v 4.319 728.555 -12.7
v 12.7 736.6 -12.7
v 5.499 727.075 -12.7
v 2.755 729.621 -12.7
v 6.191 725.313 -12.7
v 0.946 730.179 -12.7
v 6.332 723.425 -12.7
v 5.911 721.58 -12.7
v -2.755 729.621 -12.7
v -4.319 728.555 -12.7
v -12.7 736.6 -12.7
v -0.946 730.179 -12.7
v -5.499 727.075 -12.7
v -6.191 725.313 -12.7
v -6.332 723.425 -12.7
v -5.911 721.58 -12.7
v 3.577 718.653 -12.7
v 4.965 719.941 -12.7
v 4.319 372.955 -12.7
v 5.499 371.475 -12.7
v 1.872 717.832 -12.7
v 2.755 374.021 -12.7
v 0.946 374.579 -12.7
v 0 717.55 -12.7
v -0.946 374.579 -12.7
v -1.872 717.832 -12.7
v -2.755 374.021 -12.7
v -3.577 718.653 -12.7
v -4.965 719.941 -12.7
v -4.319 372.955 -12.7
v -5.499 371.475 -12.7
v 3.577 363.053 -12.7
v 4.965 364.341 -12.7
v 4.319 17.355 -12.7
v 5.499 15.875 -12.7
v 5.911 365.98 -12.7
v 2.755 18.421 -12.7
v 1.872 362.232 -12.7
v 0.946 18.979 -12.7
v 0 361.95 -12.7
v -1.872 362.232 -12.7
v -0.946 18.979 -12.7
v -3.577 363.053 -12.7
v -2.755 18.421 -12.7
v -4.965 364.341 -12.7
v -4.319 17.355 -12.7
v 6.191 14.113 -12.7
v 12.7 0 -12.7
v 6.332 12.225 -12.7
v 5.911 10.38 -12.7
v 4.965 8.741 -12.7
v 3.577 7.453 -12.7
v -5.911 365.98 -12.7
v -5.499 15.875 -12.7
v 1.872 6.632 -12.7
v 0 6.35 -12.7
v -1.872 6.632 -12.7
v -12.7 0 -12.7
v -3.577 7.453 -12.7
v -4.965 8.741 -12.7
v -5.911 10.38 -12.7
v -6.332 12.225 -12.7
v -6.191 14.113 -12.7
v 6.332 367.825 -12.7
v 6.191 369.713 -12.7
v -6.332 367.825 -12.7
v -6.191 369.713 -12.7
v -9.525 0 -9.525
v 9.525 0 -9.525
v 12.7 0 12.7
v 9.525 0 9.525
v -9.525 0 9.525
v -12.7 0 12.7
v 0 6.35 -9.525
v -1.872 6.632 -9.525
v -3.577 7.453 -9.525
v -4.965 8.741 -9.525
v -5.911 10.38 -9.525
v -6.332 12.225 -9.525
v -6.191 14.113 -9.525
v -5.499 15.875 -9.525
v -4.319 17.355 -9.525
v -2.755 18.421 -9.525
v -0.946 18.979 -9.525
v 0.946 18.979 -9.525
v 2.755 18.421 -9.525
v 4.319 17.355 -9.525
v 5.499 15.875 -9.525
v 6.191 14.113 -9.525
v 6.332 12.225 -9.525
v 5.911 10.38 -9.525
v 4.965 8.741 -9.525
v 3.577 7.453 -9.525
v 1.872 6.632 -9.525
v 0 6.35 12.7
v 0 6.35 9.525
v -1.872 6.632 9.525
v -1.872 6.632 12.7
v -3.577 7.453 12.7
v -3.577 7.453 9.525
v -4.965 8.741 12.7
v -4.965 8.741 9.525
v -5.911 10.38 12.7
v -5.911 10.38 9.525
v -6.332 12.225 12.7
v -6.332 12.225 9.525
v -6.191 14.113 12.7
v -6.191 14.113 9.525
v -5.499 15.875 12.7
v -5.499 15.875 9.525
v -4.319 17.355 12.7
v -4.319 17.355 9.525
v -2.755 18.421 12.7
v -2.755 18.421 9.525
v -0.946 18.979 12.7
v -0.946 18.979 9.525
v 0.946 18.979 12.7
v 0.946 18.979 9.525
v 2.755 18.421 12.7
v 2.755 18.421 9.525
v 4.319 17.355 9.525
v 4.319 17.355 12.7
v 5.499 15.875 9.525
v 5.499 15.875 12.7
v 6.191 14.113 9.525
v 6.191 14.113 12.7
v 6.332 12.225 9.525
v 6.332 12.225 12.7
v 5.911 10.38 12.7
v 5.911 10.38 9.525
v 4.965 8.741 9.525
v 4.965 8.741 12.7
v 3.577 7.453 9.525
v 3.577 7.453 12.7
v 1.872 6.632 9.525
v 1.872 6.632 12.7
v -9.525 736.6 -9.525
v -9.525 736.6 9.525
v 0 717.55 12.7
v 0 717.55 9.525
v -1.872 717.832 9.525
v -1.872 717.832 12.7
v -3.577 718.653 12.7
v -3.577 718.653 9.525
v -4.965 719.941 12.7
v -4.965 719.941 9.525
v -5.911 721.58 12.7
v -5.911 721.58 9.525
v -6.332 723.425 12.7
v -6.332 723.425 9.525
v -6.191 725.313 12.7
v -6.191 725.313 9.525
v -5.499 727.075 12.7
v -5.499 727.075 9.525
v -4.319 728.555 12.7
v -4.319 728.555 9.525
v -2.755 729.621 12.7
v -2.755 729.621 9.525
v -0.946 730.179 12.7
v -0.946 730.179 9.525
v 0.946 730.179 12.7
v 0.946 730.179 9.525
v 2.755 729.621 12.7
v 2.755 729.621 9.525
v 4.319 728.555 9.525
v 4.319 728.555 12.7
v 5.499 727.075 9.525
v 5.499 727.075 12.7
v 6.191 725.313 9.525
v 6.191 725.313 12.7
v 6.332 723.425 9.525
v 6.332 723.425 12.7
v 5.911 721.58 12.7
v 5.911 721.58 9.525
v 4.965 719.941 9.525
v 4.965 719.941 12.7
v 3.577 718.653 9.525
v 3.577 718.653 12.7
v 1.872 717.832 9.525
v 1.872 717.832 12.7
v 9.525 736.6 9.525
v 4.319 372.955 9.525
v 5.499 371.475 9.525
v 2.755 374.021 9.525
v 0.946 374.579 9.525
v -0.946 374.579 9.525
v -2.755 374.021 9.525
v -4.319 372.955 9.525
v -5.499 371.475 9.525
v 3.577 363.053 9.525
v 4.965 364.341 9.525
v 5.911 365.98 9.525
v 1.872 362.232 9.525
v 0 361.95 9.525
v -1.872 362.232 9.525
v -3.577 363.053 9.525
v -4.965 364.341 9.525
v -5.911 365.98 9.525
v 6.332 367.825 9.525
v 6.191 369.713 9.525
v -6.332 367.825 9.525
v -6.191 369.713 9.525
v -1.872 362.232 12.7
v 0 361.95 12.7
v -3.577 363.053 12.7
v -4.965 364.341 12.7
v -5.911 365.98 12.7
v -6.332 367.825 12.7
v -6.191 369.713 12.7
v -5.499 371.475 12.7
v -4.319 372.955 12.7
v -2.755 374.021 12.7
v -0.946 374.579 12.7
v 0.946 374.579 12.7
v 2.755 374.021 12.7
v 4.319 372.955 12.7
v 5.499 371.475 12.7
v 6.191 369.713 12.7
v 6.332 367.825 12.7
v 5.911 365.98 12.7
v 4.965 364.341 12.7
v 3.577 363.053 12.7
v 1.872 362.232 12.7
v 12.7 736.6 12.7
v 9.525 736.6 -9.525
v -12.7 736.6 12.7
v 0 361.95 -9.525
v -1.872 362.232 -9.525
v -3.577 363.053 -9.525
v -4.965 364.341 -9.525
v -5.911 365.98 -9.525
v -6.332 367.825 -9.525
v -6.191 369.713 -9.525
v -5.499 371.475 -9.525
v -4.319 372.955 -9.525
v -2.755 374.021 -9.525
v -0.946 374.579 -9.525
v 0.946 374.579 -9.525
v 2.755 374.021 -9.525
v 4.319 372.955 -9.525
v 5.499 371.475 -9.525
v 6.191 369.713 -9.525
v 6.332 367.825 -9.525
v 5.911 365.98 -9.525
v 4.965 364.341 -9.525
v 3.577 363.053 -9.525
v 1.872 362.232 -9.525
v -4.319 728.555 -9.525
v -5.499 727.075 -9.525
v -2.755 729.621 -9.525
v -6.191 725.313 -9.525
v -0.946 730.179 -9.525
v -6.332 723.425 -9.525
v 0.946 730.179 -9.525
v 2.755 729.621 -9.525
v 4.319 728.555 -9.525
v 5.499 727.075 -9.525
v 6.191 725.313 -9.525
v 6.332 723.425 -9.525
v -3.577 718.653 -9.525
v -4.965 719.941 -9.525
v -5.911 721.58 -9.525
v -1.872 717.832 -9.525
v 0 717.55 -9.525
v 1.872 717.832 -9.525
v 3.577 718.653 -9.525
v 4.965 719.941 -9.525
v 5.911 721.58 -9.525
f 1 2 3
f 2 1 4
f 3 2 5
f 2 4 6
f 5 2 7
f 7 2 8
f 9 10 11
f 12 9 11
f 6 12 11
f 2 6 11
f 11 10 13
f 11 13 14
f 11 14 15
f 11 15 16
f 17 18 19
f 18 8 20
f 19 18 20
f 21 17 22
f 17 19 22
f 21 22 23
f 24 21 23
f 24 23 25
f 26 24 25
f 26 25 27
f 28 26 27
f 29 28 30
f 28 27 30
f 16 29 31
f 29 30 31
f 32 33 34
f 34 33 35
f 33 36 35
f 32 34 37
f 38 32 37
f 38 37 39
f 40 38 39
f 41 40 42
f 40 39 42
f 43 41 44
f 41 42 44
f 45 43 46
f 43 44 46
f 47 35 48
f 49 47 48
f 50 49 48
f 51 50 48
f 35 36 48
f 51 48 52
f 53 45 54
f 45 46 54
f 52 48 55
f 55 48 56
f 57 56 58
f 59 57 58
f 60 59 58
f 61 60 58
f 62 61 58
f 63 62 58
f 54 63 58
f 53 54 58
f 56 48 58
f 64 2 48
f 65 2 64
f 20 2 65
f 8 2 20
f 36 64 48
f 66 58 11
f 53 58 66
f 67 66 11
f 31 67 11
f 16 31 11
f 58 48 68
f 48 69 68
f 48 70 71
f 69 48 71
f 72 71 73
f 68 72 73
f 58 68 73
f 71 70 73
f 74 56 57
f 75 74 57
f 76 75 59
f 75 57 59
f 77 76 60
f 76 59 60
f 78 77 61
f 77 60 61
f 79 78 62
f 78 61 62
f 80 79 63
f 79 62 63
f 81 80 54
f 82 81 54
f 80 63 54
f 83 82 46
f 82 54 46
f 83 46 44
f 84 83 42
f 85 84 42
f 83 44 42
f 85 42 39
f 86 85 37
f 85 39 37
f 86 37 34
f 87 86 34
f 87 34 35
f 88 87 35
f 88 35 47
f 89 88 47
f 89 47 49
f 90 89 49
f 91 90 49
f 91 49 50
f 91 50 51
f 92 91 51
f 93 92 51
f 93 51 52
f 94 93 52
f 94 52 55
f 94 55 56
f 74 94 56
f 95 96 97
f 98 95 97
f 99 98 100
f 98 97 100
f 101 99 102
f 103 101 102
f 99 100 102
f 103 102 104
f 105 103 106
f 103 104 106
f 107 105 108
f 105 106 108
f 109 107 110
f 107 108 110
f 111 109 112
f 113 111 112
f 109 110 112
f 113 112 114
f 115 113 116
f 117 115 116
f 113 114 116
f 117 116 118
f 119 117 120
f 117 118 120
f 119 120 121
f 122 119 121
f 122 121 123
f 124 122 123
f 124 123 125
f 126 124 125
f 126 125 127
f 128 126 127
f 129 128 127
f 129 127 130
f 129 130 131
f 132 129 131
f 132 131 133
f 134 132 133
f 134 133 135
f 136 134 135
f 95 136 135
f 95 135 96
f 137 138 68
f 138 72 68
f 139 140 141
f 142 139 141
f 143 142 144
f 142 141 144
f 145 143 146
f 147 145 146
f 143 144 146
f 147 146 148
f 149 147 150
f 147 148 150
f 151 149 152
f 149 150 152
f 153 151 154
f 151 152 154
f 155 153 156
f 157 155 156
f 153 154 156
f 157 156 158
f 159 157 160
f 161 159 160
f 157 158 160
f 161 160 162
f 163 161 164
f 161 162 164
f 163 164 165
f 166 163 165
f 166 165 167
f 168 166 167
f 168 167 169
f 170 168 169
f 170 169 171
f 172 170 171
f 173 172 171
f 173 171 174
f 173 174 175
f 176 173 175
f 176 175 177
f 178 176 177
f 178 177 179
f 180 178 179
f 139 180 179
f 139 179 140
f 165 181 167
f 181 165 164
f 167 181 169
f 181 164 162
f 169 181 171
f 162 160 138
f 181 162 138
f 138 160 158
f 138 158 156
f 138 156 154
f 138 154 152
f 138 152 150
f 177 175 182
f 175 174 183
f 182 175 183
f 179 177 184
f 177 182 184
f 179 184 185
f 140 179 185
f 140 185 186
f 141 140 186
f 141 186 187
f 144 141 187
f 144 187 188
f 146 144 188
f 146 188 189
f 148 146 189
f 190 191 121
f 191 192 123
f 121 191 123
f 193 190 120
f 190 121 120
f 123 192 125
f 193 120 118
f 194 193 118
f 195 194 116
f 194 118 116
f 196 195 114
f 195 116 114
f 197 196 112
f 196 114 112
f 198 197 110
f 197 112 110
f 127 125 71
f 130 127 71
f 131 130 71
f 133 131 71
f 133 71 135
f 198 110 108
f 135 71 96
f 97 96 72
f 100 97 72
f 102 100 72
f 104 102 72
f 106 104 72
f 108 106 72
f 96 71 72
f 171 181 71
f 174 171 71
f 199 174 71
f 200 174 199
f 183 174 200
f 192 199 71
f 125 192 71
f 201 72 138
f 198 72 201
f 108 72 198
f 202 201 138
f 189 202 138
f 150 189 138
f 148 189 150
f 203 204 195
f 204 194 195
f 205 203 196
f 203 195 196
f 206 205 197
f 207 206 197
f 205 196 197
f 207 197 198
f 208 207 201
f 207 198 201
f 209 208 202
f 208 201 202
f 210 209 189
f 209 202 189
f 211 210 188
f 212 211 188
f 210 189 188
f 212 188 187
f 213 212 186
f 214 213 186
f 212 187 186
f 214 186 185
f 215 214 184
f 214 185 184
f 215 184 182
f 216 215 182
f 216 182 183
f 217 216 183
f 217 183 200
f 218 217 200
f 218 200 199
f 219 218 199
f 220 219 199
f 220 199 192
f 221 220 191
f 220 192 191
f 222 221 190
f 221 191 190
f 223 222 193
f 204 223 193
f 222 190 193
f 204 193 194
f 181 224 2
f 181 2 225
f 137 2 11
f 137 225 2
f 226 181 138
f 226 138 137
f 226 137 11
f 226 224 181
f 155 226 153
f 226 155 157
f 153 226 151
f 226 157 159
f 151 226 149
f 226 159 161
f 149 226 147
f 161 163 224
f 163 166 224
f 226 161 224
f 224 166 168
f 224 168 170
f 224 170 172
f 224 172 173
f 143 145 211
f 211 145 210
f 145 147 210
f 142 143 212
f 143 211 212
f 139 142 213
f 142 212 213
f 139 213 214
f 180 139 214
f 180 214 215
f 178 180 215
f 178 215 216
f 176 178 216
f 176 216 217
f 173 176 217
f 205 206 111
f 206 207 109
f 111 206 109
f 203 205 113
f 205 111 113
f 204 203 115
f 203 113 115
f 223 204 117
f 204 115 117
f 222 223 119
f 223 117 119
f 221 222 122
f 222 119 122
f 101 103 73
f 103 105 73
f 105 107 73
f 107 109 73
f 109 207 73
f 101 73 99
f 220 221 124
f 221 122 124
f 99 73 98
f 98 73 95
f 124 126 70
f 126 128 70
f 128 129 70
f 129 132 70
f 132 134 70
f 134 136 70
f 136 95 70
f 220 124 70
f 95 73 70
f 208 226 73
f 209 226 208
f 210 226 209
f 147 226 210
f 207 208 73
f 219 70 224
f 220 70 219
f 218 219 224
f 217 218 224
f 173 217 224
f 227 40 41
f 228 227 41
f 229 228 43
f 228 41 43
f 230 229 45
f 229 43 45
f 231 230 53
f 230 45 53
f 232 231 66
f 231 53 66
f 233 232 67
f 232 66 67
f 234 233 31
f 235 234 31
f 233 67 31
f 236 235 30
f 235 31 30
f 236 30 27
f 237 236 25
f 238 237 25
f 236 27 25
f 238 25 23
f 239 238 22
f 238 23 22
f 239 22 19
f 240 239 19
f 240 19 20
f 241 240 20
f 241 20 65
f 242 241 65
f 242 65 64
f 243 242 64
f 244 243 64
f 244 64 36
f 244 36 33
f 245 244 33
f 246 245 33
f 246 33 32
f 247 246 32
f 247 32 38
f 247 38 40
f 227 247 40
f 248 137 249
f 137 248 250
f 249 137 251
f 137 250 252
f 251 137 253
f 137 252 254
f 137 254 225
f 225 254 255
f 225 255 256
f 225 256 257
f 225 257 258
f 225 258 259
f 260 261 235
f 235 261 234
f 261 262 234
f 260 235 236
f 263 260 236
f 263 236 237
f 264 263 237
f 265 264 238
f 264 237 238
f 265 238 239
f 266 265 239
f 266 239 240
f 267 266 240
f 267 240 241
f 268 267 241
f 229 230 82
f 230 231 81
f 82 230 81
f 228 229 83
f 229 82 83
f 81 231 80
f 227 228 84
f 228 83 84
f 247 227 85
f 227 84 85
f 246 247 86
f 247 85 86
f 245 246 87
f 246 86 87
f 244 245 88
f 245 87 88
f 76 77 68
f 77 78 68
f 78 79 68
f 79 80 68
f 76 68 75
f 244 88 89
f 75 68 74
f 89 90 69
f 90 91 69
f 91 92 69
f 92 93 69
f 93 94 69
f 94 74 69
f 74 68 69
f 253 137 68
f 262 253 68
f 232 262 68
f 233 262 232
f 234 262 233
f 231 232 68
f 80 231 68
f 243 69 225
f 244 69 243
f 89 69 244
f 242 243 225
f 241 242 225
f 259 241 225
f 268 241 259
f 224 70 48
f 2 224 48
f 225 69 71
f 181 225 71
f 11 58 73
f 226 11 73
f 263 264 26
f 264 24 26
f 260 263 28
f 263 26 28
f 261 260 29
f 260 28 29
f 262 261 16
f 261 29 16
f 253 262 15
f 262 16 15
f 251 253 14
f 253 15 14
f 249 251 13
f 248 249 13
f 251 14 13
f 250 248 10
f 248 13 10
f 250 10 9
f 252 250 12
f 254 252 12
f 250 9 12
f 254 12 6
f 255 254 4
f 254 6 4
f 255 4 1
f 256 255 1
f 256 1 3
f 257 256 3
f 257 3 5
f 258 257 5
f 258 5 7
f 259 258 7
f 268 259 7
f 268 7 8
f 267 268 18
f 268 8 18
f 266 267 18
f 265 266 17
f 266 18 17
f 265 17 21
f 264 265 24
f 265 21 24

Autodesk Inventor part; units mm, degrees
ref_plane "YZ Plane" through (0, 0, 0) normal (1, 0, 0) x (0, 1, 0)
ref_plane "XZ Plane" through (0, 0, 0) normal (0, 1, 0) x (-1, 0, 0)
ref_plane "XY Plane" through (0, 0, 0) normal (0, 0, 1) x (1, 0, 0)
sketch "Sketch1" plane through (0, 0, 0) normal (0, 1, 0) x (-1, 0, 0)
  line L0 (12.7, 12.7) -> (-12.7, 12.7)
  line L1 (-12.7, 12.7) -> (-12.7, -12.7)
  line L2 (-12.7, -12.7) -> (12.7, -12.7)
  line L3 (12.7, -12.7) -> (12.7, 12.7)
  line L4 (-9.525, 9.525) -> (9.525, 9.525)
  line L5 (9.525, 9.525) -> (9.525, -9.525)
  line L6 (9.525, -9.525) -> (-9.525, -9.525)
  line L7 (-9.525, -9.525) -> (-9.525, 9.525)
  point P0 (0, 0)
  point P1 (12.7, 0)
  point P2 (0, -12.7)
  dimension "d0" = 25.4
  dimension "d1" = 25.4
  dimension "d2" = 3.175
extrude "Extrusion1" add sketch "Sketch1" along normal blind 736.6
sketch "Sketch2" plane through (-12.7, 0, 12.7) normal (0, 0, 1) x (1, 0, 0)
  line L0 (0, 736.6) -> (25.4, 736.6) projected
  line L1 (0, 0) -> (25.4, 0) projected
  point P0 (12.7, 0)
  point P1 (12.7, 12.7)
  point P2 (12.7, 723.9)
  point P3 (12.7, 368.3)
  dimension "d5" = 12.7
  dimension "d6" = 12.7
  dimension "d7" = 368.3
hole "Hole1" at (0, 12.7, 12.7) at (0, 723.9, 12.7) at (0, 368.3, 12.7) direction (0, 0, -1) diameter 12.7 end through all
sketch "Sketch3" plane through (-12.7, 0, 12.7) normal (0, 0, 1) x (1, 0, 0)
  line L0 (21.6869, 114.0639) -> (21.6869, 96.9638) construction
  line L1 (21.6869, 96.9638) -> (5.8083, 96.9638) construction
  line L2 (5.8083, 96.9638) -> (5.8083, 114.0639) construction
  line L3 (5.8083, 114.0639) -> (21.6869, 114.0639) construction
  point P0 (12.7, 0)
equation "\"d0\" = Tube_size"
equation "\"d1\" = Tube_size"
equation "\"d2\" = Wall_Thickness"
equation "\"d3\" = Bar1_1_Length"
equation "\"d5\" = Uper_Pivit_Offset_FromEdge"
equation "\"d6\" = Lower_Pivit_Offset_FromEdge"
equation "\"d7\" = Bar1_1_Center_Pivit_Offset_FromEdge"
equation "\"d8\" = Pin_Size"
equation "\"Bar1_1_Length\" = 736.6"
equation "\"Tube_size_1\" = 25.4"
equation "\"Wall_Thickness_1\" = 3.175"
equation "\"Lower_Pivit_Offset_FromEdge\" = 12.7"
equation "\"Uper_Pivit_Offset_FromEdge\" = 12.7"
equation "\"Bar1_1_Center_Pivit_Offset_FromEdge\" = 368.3"
equation "\"Bar1_2_Length\" = 736.6"
equation "\"Bar2_1_Length\" = 736.6"
equation "\"Bar2_2_Length\" = 736.6"
equation "\"Bar3_1_Length\" = 736.6"
equation "\"Bar3_2_Length\" = 736.6"
equation "\"Tube_size\" = 25.4"
equation "\"Wall_Thickness\" = 3.175"
equation "\"Bar1_2_Center_Pivit_Offset_FromEdge\" = 368.3"
equation "\"Bar2_1_Center_Pivit_Offset_FromEdge\" = 368.3"
equation "\"Bar2_2_Center_Pivit_Offset_FromEdge\" = 368.3"
equation "\"Bar3_1_Center_Pivit_Offset_FromEdge\" = 368.3"
equation "\"Bar4_2_Center_Pivit_Offset_FromEdge\" = 355.6"
equation "\"Pin_Size\" = 12.7"
equation "\"Bar3_2_Center_Pivit_Offset_FromEdge\" = 368.3"
properties part number "2018 Bar1_1"
